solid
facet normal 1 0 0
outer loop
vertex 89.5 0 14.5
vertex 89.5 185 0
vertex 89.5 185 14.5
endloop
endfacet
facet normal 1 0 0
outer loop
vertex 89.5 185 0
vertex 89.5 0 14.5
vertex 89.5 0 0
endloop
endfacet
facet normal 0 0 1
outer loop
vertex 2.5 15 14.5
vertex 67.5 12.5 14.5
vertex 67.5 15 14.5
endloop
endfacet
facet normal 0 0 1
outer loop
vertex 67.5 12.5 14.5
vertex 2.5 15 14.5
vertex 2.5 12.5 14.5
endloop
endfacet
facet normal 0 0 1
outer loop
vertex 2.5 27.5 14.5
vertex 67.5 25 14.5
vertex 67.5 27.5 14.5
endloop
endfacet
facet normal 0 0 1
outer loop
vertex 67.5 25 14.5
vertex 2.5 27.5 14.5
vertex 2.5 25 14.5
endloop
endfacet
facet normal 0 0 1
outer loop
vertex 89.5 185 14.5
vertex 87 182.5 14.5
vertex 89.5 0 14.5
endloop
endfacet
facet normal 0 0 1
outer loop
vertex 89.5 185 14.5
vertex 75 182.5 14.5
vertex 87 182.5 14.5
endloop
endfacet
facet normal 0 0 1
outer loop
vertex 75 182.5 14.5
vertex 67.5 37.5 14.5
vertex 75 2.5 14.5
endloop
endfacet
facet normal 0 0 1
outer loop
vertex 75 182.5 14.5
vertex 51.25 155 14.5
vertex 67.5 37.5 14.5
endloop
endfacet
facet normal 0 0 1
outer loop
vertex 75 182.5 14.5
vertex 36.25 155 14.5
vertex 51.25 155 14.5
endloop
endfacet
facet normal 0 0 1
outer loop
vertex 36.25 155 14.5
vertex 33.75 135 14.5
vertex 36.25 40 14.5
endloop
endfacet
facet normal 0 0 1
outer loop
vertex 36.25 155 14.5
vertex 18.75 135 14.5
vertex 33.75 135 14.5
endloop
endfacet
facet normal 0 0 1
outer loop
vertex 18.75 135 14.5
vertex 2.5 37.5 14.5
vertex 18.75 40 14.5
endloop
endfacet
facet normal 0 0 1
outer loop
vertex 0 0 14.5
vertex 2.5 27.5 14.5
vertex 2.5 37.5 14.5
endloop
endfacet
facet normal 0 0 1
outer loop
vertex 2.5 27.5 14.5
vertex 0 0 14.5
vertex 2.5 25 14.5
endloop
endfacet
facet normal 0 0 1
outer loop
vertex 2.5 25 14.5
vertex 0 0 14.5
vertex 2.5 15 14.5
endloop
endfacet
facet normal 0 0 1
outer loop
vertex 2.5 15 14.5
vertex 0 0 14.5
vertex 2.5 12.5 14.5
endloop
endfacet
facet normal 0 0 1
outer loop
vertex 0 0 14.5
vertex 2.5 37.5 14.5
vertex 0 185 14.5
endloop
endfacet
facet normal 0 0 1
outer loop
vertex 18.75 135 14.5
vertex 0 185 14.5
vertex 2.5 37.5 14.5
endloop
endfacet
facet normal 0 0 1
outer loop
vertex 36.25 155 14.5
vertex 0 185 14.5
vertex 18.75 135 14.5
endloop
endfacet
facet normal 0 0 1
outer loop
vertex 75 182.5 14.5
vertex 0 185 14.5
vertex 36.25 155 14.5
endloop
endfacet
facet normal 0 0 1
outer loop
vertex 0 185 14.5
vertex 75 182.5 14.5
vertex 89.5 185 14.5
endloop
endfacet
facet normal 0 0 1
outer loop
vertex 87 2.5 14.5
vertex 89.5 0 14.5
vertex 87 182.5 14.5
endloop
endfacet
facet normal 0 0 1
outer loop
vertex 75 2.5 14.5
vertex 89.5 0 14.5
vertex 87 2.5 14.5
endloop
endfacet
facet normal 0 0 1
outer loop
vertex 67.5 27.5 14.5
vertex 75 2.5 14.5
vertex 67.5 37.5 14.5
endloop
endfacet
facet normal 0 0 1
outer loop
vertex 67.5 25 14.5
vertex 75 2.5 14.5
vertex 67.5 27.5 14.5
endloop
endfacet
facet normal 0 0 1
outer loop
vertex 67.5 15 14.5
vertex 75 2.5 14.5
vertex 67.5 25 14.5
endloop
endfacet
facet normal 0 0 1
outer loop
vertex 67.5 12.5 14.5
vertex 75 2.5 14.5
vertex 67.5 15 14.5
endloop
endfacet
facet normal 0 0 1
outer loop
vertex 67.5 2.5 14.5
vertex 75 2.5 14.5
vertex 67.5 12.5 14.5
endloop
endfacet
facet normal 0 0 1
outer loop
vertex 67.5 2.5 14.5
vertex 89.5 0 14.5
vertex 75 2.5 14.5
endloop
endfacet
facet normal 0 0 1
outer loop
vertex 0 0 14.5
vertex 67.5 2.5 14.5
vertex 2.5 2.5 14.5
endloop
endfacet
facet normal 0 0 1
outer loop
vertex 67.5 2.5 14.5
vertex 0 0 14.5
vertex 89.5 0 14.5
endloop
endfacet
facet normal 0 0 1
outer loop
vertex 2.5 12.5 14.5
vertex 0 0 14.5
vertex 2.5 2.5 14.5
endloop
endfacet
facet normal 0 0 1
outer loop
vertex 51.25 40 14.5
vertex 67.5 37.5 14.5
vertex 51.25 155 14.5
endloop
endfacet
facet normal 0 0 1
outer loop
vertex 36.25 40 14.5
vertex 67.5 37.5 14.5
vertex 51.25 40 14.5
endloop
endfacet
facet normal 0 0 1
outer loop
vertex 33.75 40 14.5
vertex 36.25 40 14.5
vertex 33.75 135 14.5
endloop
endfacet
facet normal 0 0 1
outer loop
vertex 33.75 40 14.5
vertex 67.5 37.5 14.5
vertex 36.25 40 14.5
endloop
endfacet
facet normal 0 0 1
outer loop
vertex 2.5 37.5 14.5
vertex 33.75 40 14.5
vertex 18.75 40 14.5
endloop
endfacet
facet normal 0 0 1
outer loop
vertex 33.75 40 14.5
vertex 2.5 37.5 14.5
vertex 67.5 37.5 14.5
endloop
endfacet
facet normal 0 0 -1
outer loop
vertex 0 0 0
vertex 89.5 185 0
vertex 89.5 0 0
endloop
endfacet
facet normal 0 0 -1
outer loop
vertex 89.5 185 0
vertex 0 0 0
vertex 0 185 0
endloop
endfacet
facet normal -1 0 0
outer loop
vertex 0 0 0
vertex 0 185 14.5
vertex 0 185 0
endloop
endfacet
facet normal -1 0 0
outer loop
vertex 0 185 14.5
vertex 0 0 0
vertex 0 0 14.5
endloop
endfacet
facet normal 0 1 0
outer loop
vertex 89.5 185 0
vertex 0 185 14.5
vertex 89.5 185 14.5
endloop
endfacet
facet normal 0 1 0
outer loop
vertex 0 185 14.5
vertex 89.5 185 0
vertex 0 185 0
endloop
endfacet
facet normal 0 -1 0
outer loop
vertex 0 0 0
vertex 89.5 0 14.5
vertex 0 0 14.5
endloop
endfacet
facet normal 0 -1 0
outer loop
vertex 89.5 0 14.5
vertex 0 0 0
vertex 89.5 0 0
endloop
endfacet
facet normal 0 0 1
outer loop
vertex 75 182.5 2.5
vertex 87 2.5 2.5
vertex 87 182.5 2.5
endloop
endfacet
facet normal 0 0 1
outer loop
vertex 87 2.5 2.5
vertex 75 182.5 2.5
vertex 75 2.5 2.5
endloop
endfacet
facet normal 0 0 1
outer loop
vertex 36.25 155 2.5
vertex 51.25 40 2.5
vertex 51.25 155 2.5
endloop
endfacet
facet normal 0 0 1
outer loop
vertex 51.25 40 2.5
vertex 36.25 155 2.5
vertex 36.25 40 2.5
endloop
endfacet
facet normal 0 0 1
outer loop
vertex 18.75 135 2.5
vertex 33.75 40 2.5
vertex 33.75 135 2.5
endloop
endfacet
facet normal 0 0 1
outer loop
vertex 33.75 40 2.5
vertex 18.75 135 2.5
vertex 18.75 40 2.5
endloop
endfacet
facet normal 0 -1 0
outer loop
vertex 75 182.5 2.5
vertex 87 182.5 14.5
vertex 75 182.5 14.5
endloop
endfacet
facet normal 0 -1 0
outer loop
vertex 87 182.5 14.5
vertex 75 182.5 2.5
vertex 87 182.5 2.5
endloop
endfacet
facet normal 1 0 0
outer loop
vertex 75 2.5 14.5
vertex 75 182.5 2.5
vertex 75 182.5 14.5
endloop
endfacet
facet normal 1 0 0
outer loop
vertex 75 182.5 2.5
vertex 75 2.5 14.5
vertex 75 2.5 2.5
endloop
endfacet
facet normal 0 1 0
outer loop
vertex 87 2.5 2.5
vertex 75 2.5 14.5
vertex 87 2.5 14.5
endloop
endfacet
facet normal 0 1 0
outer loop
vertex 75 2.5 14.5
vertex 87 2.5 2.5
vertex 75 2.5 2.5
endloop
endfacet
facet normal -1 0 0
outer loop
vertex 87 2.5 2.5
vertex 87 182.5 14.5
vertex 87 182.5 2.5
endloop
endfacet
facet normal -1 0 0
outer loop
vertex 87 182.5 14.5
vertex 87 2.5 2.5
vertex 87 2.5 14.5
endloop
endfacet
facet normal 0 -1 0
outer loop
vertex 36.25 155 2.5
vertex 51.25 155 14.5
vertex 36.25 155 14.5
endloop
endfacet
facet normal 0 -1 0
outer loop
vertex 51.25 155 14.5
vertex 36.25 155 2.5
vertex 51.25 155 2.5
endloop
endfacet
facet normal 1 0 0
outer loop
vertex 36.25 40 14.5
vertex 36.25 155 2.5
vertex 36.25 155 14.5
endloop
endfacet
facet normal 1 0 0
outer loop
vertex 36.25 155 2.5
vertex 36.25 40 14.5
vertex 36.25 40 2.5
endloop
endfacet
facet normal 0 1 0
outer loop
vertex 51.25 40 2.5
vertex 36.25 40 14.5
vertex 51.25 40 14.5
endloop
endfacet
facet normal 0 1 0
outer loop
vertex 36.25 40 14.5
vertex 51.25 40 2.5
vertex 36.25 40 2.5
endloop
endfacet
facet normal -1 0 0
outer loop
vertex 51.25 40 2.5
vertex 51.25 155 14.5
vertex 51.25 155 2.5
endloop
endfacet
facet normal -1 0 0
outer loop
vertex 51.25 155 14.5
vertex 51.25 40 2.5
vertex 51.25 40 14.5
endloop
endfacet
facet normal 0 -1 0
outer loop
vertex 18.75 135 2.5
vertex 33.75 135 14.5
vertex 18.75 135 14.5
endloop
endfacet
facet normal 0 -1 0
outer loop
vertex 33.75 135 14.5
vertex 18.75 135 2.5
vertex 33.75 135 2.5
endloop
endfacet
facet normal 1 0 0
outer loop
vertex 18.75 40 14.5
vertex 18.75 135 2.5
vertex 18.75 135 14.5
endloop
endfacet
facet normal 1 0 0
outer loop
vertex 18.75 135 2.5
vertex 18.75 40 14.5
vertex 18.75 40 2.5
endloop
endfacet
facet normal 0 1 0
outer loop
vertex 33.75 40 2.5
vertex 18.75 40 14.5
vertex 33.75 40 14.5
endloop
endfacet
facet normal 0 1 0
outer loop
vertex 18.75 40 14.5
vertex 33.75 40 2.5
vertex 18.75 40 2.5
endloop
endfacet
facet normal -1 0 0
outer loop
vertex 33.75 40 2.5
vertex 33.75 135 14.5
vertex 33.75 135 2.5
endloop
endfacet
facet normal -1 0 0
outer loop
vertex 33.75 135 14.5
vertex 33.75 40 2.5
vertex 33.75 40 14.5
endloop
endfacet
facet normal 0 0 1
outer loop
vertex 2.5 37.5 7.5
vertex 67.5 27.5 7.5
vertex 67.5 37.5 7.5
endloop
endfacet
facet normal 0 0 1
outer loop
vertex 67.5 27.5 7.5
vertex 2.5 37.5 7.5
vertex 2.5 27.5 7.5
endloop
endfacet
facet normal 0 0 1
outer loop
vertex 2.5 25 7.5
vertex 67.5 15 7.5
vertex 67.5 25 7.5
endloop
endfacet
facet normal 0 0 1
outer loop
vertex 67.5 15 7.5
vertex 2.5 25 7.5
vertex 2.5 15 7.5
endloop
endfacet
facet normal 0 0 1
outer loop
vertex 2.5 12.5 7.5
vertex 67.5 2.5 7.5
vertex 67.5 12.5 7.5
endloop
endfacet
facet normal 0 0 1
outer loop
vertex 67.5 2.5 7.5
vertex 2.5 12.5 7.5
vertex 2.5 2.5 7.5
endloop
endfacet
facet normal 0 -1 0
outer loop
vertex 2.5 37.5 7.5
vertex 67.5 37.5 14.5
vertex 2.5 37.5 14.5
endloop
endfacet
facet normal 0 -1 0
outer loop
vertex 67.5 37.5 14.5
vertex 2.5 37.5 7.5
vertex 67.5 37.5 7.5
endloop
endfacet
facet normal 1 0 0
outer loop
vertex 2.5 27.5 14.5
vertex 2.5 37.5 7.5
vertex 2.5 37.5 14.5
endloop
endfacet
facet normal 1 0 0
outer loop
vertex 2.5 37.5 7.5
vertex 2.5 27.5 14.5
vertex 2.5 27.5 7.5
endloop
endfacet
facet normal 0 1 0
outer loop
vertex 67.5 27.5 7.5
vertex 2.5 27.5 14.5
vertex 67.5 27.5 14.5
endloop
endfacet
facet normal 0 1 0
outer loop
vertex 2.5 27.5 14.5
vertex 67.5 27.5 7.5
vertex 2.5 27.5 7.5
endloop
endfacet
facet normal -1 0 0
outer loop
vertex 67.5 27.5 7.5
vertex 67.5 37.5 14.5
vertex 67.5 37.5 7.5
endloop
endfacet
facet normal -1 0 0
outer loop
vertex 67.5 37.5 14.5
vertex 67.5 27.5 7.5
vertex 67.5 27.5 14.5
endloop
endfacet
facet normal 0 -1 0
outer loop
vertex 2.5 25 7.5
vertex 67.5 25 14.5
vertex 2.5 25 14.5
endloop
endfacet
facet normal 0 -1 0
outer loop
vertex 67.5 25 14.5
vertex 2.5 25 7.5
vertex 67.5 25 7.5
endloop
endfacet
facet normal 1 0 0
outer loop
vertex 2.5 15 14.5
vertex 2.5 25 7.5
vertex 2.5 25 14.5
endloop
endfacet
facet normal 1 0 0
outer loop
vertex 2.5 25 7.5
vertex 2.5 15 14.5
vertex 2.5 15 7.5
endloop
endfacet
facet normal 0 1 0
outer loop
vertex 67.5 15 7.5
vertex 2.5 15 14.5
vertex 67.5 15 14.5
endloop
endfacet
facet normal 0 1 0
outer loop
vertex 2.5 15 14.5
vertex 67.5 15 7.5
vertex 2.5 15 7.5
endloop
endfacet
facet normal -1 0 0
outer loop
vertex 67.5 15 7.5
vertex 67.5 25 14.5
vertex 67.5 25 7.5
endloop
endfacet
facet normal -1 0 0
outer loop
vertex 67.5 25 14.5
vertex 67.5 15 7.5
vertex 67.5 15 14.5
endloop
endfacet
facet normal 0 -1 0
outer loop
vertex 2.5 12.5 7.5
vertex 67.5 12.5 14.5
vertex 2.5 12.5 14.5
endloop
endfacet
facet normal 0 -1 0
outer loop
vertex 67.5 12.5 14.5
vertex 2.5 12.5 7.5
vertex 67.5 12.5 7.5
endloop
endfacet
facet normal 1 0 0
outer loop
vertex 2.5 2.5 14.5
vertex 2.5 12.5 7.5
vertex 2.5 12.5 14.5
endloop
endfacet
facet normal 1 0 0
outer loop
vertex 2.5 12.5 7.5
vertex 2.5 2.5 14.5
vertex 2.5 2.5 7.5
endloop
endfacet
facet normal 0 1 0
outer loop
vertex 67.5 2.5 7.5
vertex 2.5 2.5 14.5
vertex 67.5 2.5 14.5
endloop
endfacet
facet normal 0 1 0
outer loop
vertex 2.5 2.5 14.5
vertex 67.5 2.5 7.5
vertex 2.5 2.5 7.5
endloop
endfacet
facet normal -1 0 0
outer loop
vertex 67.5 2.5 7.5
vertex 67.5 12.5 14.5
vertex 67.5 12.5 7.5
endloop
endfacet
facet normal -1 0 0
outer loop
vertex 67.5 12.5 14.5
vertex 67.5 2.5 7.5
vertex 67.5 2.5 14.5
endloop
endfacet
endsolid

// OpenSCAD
// created by IndiePandaaaaa|Lukas

TOLERANCE = 0.15;
FN = $preview ? 25 : 120;

MATERIAL_THICKNESS = 2.5;
BOX_THICKNESS = 12;

TAP_WRENCH_WIDTH = 12; // wrench is turned for better accessability
TAP_WRENCH_HEIGHT = 180;

TAP_CUTTER_METRICAL_WIDTH = 10;
TAP_CUTTER_METRICAL_HEIGHT = 65;
TAP_CUTTER_METRICAL_THICKNESS = 7;
TAP_CUTTER_METRICAL_ADDITIONAL_OFFSET = 5;

TAP_CUTTER_UNC14_WIDTH = 15;
TAP_CUTTER_UNC14_HEIGHT = 95;
TAP_CUTTER_UNC38_WIDTH = 15;
TAP_CUTTER_UNC38_HEIGHT = 115;

FULL_WIDTH = TAP_WRENCH_WIDTH + TAP_CUTTER_METRICAL_HEIGHT + MATERIAL_THICKNESS * 3 +
  TAP_CUTTER_METRICAL_ADDITIONAL_OFFSET;
FULL_HEIGHT = TAP_WRENCH_HEIGHT + MATERIAL_THICKNESS * 2;
FULL_THICKNESS = MATERIAL_THICKNESS + BOX_THICKNESS;

difference() {
  cube([FULL_WIDTH, FULL_HEIGHT, FULL_THICKNESS]);
  translate([0, 0, MATERIAL_THICKNESS]) linear_extrude(BOX_THICKNESS) {
    // imperial tap cutters
    unc_width = TAP_CUTTER_METRICAL_HEIGHT - (TAP_CUTTER_UNC14_WIDTH + TAP_CUTTER_UNC38_WIDTH + MATERIAL_THICKNESS);
    translate([unc_width / 2, (TAP_CUTTER_METRICAL_WIDTH + MATERIAL_THICKNESS) * 3, 0]) polygon([
        [MATERIAL_THICKNESS, MATERIAL_THICKNESS],
        [MATERIAL_THICKNESS + TAP_CUTTER_UNC14_WIDTH, MATERIAL_THICKNESS],
        [MATERIAL_THICKNESS + TAP_CUTTER_UNC14_WIDTH, MATERIAL_THICKNESS + TAP_CUTTER_UNC14_HEIGHT],
        [MATERIAL_THICKNESS, MATERIAL_THICKNESS + TAP_CUTTER_UNC14_HEIGHT],
      ]);
    translate([unc_width / 2 + TAP_CUTTER_UNC14_WIDTH + MATERIAL_THICKNESS,
        (TAP_CUTTER_METRICAL_WIDTH + MATERIAL_THICKNESS) * 3, 0]) polygon([
        [MATERIAL_THICKNESS, MATERIAL_THICKNESS],
        [MATERIAL_THICKNESS + TAP_CUTTER_UNC38_WIDTH, MATERIAL_THICKNESS],
        [MATERIAL_THICKNESS + TAP_CUTTER_UNC38_WIDTH, MATERIAL_THICKNESS + TAP_CUTTER_UNC38_HEIGHT],
        [MATERIAL_THICKNESS, MATERIAL_THICKNESS + TAP_CUTTER_UNC38_HEIGHT],
      ]);
    // tap wrench
    translate([TAP_CUTTER_METRICAL_HEIGHT + MATERIAL_THICKNESS + TAP_CUTTER_METRICAL_ADDITIONAL_OFFSET, 0, 0])
      polygon([
          [MATERIAL_THICKNESS, MATERIAL_THICKNESS],
          [MATERIAL_THICKNESS + TAP_WRENCH_WIDTH, MATERIAL_THICKNESS],
          [MATERIAL_THICKNESS + TAP_WRENCH_WIDTH, MATERIAL_THICKNESS + TAP_WRENCH_HEIGHT],
          [MATERIAL_THICKNESS, MATERIAL_THICKNESS + TAP_WRENCH_HEIGHT],
        ]);
  }
  translate([0, 0, MATERIAL_THICKNESS + (BOX_THICKNESS - TAP_CUTTER_METRICAL_THICKNESS)])
    linear_extrude(BOX_THICKNESS) {
      for (i = [0:2]) {// metrical tap cutters
        translate([0, (TAP_CUTTER_METRICAL_WIDTH + MATERIAL_THICKNESS) * i, 0]) polygon([
            [MATERIAL_THICKNESS, MATERIAL_THICKNESS],
            [MATERIAL_THICKNESS + TAP_CUTTER_METRICAL_HEIGHT, MATERIAL_THICKNESS],
            [MATERIAL_THICKNESS + TAP_CUTTER_METRICAL_HEIGHT, MATERIAL_THICKNESS + TAP_CUTTER_METRICAL_WIDTH
            ],
            [MATERIAL_THICKNESS, MATERIAL_THICKNESS + TAP_CUTTER_METRICAL_WIDTH],
          ]);
      }
    }

}
